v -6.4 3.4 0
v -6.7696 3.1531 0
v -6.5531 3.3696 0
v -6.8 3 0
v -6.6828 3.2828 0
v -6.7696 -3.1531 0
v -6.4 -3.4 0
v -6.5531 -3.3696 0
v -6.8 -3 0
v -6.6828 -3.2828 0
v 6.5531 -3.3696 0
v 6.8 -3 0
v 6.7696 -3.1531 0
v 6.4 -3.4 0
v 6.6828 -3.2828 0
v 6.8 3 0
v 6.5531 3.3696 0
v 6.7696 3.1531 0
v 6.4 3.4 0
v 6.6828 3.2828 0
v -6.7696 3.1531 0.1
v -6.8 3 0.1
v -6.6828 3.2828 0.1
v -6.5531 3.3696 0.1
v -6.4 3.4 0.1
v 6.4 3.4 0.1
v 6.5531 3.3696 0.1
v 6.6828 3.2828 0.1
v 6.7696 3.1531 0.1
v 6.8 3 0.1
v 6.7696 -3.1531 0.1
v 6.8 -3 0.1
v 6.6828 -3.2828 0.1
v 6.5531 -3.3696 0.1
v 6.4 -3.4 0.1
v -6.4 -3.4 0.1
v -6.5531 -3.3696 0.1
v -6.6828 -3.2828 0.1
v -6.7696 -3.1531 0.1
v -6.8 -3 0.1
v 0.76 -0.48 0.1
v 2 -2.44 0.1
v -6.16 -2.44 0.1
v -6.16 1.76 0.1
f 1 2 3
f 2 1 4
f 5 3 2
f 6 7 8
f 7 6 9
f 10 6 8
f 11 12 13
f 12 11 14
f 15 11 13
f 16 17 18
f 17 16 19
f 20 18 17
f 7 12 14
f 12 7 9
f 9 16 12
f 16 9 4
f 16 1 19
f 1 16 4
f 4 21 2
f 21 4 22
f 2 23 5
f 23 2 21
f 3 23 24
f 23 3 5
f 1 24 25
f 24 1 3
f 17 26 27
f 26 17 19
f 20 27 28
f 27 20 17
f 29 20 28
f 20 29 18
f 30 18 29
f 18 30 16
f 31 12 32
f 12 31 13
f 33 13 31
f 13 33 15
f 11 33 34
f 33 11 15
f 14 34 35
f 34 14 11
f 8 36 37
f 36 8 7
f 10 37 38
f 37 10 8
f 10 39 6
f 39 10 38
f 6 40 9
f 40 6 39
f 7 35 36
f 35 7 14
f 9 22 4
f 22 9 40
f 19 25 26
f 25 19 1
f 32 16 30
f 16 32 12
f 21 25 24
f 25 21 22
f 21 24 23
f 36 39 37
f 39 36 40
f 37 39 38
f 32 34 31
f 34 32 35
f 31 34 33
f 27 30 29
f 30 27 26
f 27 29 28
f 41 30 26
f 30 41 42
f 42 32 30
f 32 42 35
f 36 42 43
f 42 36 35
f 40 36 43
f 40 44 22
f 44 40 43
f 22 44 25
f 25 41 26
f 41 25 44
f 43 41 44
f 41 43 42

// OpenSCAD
// file: ../p/1-4cyli.scad
use <../lib.scad>
function ldraw_lib__1_4cyli() = [
// 0 Cylinder 0.25
// 0 Name: 1-4cyli.dat
// 0 Author: James Jessiman
// 0 !LDRAW_ORG Primitive UPDATE 2012-01
// 0 !LICENSE Licensed under CC BY 4.0 : see CAreadme.txt
// 
// 0 BFC CERTIFY CCW
  [0,"BFC","CERTIFY"],
  [0,"BFC","CCW"],
// 
// 0 !HISTORY 2002-03-23 [sbliss] Added BFC statement.
// 0 !HISTORY 2002-04-25 [PTadmin] Official Update 2002-02
// 0 !HISTORY 2007-06-22 [PTadmin] Header formatted for Contributor Agreement
// 0 !HISTORY 2008-07-01 [PTadmin] Official Update 2008-01
// 0 !HISTORY 2012-02-16 [Philo] Changed to CCW
// 0 !HISTORY 2012-03-30 [PTadmin] Official Update 2012-01
// 
// 
// 4 16 1 1 0 0.9239 1 0.3827 0.9239 0 0.3827 1 0 0
  [4,16,1,1,0,0.9239,1,0.3827,0.9239,0,0.3827,1,0,0],
// 5 24 1 0 0 1 1 0 0.9239 0 0.3827 1 0 -1
  [5,24,1,0,0,1,1,0,0.9239,0,0.3827,1,0,-1],
// 4 16 0.9239 1 0.3827 0.7071 1 0.7071 0.7071 0 0.7071 0.9239 0 0.3827
  [4,16,0.9239,1,0.3827,0.7071,1,0.7071,0.7071,0,0.7071,0.9239,0,0.3827],
// 5 24 0.9239 0 0.3827 0.9239 1 0.3827 0.7071 0 0.7071 1 0 0
  [5,24,0.9239,0,0.3827,0.9239,1,0.3827,0.7071,0,0.7071,1,0,0],
// 4 16 0.7071 1 0.7071 0.3827 1 0.9239 0.3827 0 0.9239 0.7071 0 0.7071
  [4,16,0.7071,1,0.7071,0.3827,1,0.9239,0.3827,0,0.9239,0.7071,0,0.7071],
// 5 24 0.7071 0 0.7071 0.7071 1 0.7071 0.3827 0 0.9239 0.9239 0 0.3827
  [5,24,0.7071,0,0.7071,0.7071,1,0.7071,0.3827,0,0.9239,0.9239,0,0.3827],
// 4 16 0.3827 1 0.9239 0 1 1 0 0 1 0.3827 0 0.9239
  [4,16,0.3827,1,0.9239,0,1,1,0,0,1,0.3827,0,0.9239],
// 5 24 0.3827 0 0.9239 0.3827 1 0.9239 0 0 1 0.7071 0 0.7071
  [5,24,0.3827,0,0.9239,0.3827,1,0.9239,0,0,1,0.7071,0,0.7071],
// 5 24 0 0 1 0 1 1 0.3827 0 0.9239 -1 0 1
  [5,24,0,0,1,0,1,1,0.3827,0,0.9239,-1,0,1],
];
module ldraw_lib__1_4cyli(step=0, col=false, unit=2/5, alt=false, line=0.2, solid=!$preview)
    makepoly(ldraw_lib__1_4cyli(), step=step, col=col, unit=unit, alt=alt, line=line, solid=solid);
ldraw_lib__1_4cyli(line=0.2);
// file: ../p/1-4chrd.scad
use <../lib.scad>
function ldraw_lib__1_4chrd() = [
// 0 Chord 0.25
// 0 Name: 1-4chrd.dat
// 0 Author: Max Martin Richter [MMR1988]
// 0 !LDRAW_ORG Primitive UPDATE 2023-05
// 0 !LICENSE Licensed under CC BY 4.0 : see CAreadme.txt
// 
// 0 BFC CERTIFY CCW
  [0,"BFC","CERTIFY"],
  [0,"BFC","CCW"],
// 
// 0 !HISTORY 2004-04-22 [PTadmin] Official Update 2004-02
// 0 !HISTORY 2007-10-09 [PTadmin] Header formatted for Contributor Agreement
// 0 !HISTORY 2008-07-01 [PTadmin] Official Update 2008-01
// 0 !HISTORY 2012-08-02 [MMR1988] Re-creation with PrimGen2 and Rectifier
// 0 !HISTORY 2012-08-09 [PTadmin] Official Update 2012-02
// 0 !HISTORY 2023-10-27 [OrionP] Change author to MMR1988 from hafhead
// 0 !HISTORY 2023-10-31 [OrionP] Official Update 2023-05
// 
// 4 16 0.9239 0 0.3827 0.3827 0 0.9239 0 0 1 1 0 0
  [4,16,0.9239,0,0.3827,0.3827,0,0.9239,0,0,1,1,0,0],
// 3 16 0.7071 0 0.7071 0.3827 0 0.9239 0.9239 0 0.3827
  [3,16,0.7071,0,0.7071,0.3827,0,0.9239,0.9239,0,0.3827],
];
module ldraw_lib__1_4chrd(step=0, col=false, unit=2/5, alt=false, line=0.2, solid=!$preview)
    makepoly(ldraw_lib__1_4chrd(), step=step, col=col, unit=unit, alt=alt, line=line, solid=solid);
ldraw_lib__1_4chrd(line=0.2);
// file: 6347356g.scad
use <../lib.scad>
use <../p/1-4chrd.scad>
use <../p/1-4cyli.scad>
function ldraw_lib__6347356g() = [
// 0 Sticker  0.8 x  1.7 with Bright Light Orange Trapezoid Short Left
// 0 Name: 6347356g.dat
// 0 Author: Evert-Jan Boer [ejboer]
// 0 !LDRAW_ORG Part UPDATE 2024-06
// 0 !LICENSE Licensed under CC BY 4.0 : see CAreadme.txt
// 
// 0 BFC CERTIFY CCW
  [0,"BFC","CERTIFY"],
  [0,"BFC","CCW"],
// 
// 0 !KEYWORDS Republic Gunship, Set 75309, Star Wars
// 
// 0 !HISTORY 2024-07-29 [OrionP] Official Update 2024-06
// 
// 1 16 16 0 7.5 1 0 0 0 -1 0 0 0 1 1-4chrd.dat
  [1,16,16,0,7.5,1,0,0,0,-1,0,0,0,1, ldraw_lib__1_4chrd()],
// 1 16 16 0 -7.5 0 0 1 0 -1 0 -1 0 0 1-4chrd.dat
  [1,16,16,0,-7.5,0,0,1,0,-1,0,-1,0,0, ldraw_lib__1_4chrd()],
// 1 16 -16 0 -7.5 -1 0 0 0 -1 0 0 0 -1 1-4chrd.dat
  [1,16,-16,0,-7.5,-1,0,0,0,-1,0,0,0,-1, ldraw_lib__1_4chrd()],
// 1 16 -16 0 7.5 0 0 -1 0 -1 0 1 0 0 1-4chrd.dat
  [1,16,-16,0,7.5,0,0,-1,0,-1,0,1,0,0, ldraw_lib__1_4chrd()],
// 4 16 16 0 -8.5 -16 0 -8.5 -17 0 -7.5 17 0 -7.5
  [4,16,16,0,-8.5,-16,0,-8.5,-17,0,-7.5,17,0,-7.5],
// 4 16 17 0 7.5 17 0 -7.5 -17 0 -7.5 -17 0 7.5
  [4,16,17,0,7.5,17,0,-7.5,-17,0,-7.5,-17,0,7.5],
// 4 16 17 0 7.5 -17 0 7.5 -16 0 8.5 16 0 8.5
  [4,16,17,0,7.5,-17,0,7.5,-16,0,8.5,16,0,8.5],
// 
// 1 16 16 -.25 7.5 1 0 0 0 .25 0 0 0 1 1-4cyli.dat
  [1,16,16,-.25,7.5,1,0,0,0,.25,0,0,0,1, ldraw_lib__1_4cyli()],
// 1 16 -16 -.25 7.5 0 0 -1 0 .25 0 1 0 0 1-4cyli.dat
  [1,16,-16,-.25,7.5,0,0,-1,0,.25,0,1,0,0, ldraw_lib__1_4cyli()],
// 1 16 -16 -.25 -7.5 -1 0 0 0 .25 0 0 0 -1 1-4cyli.dat
  [1,16,-16,-.25,-7.5,-1,0,0,0,.25,0,0,0,-1, ldraw_lib__1_4cyli()],
// 1 16 16 -.25 -7.5 0 0 1 0 .25 0 -1 0 0 1-4cyli.dat
  [1,16,16,-.25,-7.5,0,0,1,0,.25,0,-1,0,0, ldraw_lib__1_4cyli()],
// 4 16 16 -.25 -8.5 -16 -.25 -8.5 -16 0 -8.5 16 0 -8.5
  [4,16,16,-.25,-8.5,-16,-.25,-8.5,-16,0,-8.5,16,0,-8.5],
// 4 16 17 -.25 7.5 17 -.25 -7.5 17 0 -7.5 17 0 7.5
  [4,16,17,-.25,7.5,17,-.25,-7.5,17,0,-7.5,17,0,7.5],
// 4 16 -16 -.25 8.5 16 -.25 8.5 16 0 8.5 -16 0 8.5
  [4,16,-16,-.25,8.5,16,-.25,8.5,16,0,8.5,-16,0,8.5],
// 4 16 -17 -.25 -7.5 -17 -.25 7.5 -17 0 7.5 -17 0 -7.5
  [4,16,-17,-.25,-7.5,-17,-.25,7.5,-17,0,7.5,-17,0,-7.5],
// 
// 1 16 16 -.25 7.5 1 0 0 0 1 0 0 0 1 1-4chrd.dat
  [1,16,16,-.25,7.5,1,0,0,0,1,0,0,0,1, ldraw_lib__1_4chrd()],
// 1 16 16 -.25 -7.5 0 0 1 0 1 0 -1 0 0 1-4chrd.dat
  [1,16,16,-.25,-7.5,0,0,1,0,1,0,-1,0,0, ldraw_lib__1_4chrd()],
// 1 16 -16 -.25 -7.5 -1 0 0 0 1 0 0 0 -1 1-4chrd.dat
  [1,16,-16,-.25,-7.5,-1,0,0,0,1,0,0,0,-1, ldraw_lib__1_4chrd()],
// 1 16 -16 -.25 7.5 0 0 -1 0 1 0 1 0 0 1-4chrd.dat
  [1,16,-16,-.25,7.5,0,0,-1,0,1,0,1,0,0, ldraw_lib__1_4chrd()],
// 4 16 -16 -.25 8.5 -17 -.25 7.5 -5 -.25 -6.1 -1.9 -.25 -1.2
  [4,16,-16,-.25,8.5,-17,-.25,7.5,-5,-.25,-6.1,-1.9,-.25,-1.2],
// 4 16 -16 -.25 -8.5 -5 -.25 -6.1 -17 -.25 7.5 -17 -.25 -7.5
  [4,16,-16,-.25,-8.5,-5,-.25,-6.1,-17,-.25,7.5,-17,-.25,-7.5],
// 4 16 16 -.25 -8.5 15.4 -.25 -6.1 -5 -.25 -6.1 -16 -.25 -8.5
  [4,16,16,-.25,-8.5,15.4,-.25,-6.1,-5,-.25,-6.1,-16,-.25,-8.5],
// 3 16 15.4 -.25 -6.1 16 -.25 -8.5 17 -.25 -7.5
  [3,16,15.4,-.25,-6.1,16,-.25,-8.5,17,-.25,-7.5],
// 4 16 17 -.25 7.5 15.4 -.25 4.4 15.4 -.25 -6.1 17 -.25 -7.5
  [4,16,17,-.25,7.5,15.4,-.25,4.4,15.4,-.25,-6.1,17,-.25,-7.5],
// 3 16 16 -.25 8.5 15.4 -.25 4.4 17 -.25 7.5
  [3,16,16,-.25,8.5,15.4,-.25,4.4,17,-.25,7.5],
// 4 16 16 -.25 8.5 -16 -.25 8.5 -1.9 -.25 -1.2 15.4 -.25 4.4
  [4,16,16,-.25,8.5,-16,-.25,8.5,-1.9,-.25,-1.2,15.4,-.25,4.4],
// 
// 0 BFC NOCLIP
  [0,"BFC","NOCLIP"],
// 4 191 15.4 -.25 4.4 -1.9 -.25 -1.2 -5 -.25 -6.1 15.4 -.25 -6.1
  [4,191,15.4,-.25,4.4,-1.9,-.25,-1.2,-5,-.25,-6.1,15.4,-.25,-6.1],
];
module ldraw_lib__6347356g(step=0, col=false, unit=2/5, alt=false, line=0.2, solid=!$preview)
    makepoly(ldraw_lib__6347356g(), step=step, col=col, unit=unit, alt=alt, line=line, solid=solid);
ldraw_lib__6347356g(line=0.2);
// main file
use <../lib.scad>
use <6347356g.scad>
function ldraw_lib__6347356h() = [
// 0 Sticker  0.8 x  1.7 with Bright Light Orange Trapezoid Short Right
// 0 Name: 6347356h.dat
// 0 Author: Evert-Jan Boer [ejboer]
// 0 !LDRAW_ORG Part UPDATE 2024-06
// 0 !LICENSE Licensed under CC BY 4.0 : see CAreadme.txt
// 
// 0 BFC CERTIFY CCW
  [0,"BFC","CERTIFY"],
  [0,"BFC","CCW"],
// 
// 0 !KEYWORDS Republic Gunship, Set 75309, Star Wars
// 
// 0 !HISTORY 2024-07-29 [OrionP] Official Update 2024-06
// 
// 1 16 0 0 0 -1 0 0 0 1 0 0 0 1 6347356g.dat
  [1,16,0,0,0,-1,0,0,0,1,0,0,0,1, ldraw_lib__6347356g()],
];
module ldraw_lib__6347356h(step=0, col=false, unit=2/5, alt=false, line=0.2, solid=!$preview)
    makepoly(ldraw_lib__6347356h(), step=step, col=col, unit=unit, alt=alt, line=line, solid=solid);
ldraw_lib__6347356h(line=0.2);
